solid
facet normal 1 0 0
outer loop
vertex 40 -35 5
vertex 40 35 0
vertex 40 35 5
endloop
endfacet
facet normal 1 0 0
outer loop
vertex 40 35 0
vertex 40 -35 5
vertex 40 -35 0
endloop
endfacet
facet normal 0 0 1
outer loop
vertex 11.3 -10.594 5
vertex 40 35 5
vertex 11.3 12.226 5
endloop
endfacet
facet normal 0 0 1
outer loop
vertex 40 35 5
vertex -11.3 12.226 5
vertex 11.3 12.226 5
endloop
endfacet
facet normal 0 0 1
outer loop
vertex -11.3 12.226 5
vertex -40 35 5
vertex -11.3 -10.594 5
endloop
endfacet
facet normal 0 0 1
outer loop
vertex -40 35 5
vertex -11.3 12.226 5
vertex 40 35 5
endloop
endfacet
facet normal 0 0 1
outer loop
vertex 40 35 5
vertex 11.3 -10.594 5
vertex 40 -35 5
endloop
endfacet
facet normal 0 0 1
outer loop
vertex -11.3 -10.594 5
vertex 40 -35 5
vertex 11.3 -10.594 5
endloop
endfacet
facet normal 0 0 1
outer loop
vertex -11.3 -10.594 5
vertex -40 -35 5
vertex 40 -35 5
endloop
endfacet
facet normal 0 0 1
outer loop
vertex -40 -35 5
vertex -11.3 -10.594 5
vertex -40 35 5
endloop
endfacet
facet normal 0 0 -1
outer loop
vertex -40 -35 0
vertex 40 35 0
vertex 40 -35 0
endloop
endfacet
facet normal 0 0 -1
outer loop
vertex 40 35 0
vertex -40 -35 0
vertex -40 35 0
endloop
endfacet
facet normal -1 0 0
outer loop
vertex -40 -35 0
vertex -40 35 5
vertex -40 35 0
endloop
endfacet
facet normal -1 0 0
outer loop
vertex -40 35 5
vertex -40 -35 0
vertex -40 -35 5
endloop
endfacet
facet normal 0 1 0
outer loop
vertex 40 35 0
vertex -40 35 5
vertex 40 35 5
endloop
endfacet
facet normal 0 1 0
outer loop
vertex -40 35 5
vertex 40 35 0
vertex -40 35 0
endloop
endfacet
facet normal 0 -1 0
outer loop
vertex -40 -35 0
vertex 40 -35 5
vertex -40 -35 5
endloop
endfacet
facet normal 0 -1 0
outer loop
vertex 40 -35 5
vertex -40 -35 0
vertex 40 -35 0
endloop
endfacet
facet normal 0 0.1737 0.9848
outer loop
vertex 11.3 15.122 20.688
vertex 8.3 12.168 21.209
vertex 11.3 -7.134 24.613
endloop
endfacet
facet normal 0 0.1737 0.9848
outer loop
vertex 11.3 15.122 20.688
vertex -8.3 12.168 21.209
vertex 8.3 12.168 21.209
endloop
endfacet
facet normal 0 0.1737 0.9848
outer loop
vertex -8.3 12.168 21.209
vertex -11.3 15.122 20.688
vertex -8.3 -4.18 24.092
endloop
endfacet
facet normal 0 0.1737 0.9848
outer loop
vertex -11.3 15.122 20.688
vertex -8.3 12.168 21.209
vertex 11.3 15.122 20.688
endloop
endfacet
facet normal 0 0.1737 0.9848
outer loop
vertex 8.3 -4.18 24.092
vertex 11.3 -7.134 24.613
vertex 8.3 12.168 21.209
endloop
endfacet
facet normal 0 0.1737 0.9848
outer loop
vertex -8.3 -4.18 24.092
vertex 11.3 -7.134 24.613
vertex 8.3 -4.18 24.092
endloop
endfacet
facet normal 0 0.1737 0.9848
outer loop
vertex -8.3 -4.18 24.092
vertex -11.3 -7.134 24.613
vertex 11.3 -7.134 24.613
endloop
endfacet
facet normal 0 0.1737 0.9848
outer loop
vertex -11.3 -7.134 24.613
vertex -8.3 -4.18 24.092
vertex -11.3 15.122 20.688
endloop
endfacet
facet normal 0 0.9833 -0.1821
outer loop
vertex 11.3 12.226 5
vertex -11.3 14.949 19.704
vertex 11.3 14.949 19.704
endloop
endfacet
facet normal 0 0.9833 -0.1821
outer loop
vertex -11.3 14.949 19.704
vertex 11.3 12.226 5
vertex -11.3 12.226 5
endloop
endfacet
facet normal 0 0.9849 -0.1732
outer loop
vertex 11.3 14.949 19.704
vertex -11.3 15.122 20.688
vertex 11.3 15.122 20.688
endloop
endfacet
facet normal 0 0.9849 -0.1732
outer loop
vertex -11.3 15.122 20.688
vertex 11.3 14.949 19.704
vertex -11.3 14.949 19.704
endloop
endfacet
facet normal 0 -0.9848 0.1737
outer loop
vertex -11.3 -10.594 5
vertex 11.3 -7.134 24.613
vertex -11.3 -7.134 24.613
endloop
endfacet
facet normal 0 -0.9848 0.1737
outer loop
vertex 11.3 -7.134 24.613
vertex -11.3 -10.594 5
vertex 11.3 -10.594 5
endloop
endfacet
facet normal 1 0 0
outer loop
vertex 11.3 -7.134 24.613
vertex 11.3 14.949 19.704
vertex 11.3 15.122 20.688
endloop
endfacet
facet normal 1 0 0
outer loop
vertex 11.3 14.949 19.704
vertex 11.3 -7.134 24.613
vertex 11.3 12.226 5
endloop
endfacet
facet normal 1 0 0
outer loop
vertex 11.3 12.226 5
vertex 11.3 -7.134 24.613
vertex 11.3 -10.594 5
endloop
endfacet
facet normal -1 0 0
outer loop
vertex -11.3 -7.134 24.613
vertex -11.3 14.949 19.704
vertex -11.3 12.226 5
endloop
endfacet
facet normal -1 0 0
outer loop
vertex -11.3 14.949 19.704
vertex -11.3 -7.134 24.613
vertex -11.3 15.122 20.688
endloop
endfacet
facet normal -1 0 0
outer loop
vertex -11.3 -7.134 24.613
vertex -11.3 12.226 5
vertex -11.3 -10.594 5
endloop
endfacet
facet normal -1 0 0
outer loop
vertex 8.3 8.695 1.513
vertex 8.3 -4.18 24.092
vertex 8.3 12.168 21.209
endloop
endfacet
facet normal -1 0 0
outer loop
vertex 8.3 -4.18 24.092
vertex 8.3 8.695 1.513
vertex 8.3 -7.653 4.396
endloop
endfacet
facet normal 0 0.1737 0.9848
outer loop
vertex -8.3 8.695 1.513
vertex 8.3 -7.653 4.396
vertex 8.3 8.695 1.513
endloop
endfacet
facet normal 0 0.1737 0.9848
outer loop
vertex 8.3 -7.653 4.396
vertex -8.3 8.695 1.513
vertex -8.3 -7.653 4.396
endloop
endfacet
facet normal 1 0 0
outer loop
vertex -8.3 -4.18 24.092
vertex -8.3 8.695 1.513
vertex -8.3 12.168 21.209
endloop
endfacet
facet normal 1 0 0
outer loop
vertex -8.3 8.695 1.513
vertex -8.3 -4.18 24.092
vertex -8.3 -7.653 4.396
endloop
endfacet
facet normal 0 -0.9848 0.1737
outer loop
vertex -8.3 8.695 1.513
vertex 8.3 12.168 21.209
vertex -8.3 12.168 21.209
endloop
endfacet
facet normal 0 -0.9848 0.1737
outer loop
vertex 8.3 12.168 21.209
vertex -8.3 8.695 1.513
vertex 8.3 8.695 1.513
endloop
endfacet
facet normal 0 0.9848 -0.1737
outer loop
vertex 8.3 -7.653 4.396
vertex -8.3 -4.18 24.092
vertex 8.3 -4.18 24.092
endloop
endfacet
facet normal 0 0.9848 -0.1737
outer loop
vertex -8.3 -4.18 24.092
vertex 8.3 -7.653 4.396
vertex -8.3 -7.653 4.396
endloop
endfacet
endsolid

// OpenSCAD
// Desk foot for eye_test_stand.scad: a weighted base with a socket the stand's stem plugs into,
// tilted back so the eye looks up 10 deg (a seated person at a desk). Print flat, no supports.
include <../../params.scad>

stem     = [16, 16];            // the stand's stem cross-section
fit      = 0.3;                 // each side: snug push fit
tilt     = 10;                  // eye looks up this much
base     = [80, 70, 5];
sock_h   = 22;                  // socket depth along the stem
block    = [stem[0] + 2 * fit + 6, stem[1] + 2 * fit + 6];

difference() {
    union() {
        translate([-base[0] / 2, -base[1] / 2, 0]) cube(base);
        // socket block, leaning back by `tilt`
        hull() {
            translate([-block[0] / 2, -block[1] / 2, 0]) cube([block[0], block[1], 1]);
            rotate([-tilt, 0, 0]) translate([-block[0] / 2, -block[1] / 2, sock_h]) cube([block[0], block[1], 1]);
        }
    }
    // the socket (open at the top, along the tilted axis)
    rotate([-tilt, 0, 0]) translate([-(stem[0] / 2 + fit), -(stem[1] / 2 + fit), 3])
        cube([stem[0] + 2 * fit, stem[1] + 2 * fit, sock_h + 10]);
}
